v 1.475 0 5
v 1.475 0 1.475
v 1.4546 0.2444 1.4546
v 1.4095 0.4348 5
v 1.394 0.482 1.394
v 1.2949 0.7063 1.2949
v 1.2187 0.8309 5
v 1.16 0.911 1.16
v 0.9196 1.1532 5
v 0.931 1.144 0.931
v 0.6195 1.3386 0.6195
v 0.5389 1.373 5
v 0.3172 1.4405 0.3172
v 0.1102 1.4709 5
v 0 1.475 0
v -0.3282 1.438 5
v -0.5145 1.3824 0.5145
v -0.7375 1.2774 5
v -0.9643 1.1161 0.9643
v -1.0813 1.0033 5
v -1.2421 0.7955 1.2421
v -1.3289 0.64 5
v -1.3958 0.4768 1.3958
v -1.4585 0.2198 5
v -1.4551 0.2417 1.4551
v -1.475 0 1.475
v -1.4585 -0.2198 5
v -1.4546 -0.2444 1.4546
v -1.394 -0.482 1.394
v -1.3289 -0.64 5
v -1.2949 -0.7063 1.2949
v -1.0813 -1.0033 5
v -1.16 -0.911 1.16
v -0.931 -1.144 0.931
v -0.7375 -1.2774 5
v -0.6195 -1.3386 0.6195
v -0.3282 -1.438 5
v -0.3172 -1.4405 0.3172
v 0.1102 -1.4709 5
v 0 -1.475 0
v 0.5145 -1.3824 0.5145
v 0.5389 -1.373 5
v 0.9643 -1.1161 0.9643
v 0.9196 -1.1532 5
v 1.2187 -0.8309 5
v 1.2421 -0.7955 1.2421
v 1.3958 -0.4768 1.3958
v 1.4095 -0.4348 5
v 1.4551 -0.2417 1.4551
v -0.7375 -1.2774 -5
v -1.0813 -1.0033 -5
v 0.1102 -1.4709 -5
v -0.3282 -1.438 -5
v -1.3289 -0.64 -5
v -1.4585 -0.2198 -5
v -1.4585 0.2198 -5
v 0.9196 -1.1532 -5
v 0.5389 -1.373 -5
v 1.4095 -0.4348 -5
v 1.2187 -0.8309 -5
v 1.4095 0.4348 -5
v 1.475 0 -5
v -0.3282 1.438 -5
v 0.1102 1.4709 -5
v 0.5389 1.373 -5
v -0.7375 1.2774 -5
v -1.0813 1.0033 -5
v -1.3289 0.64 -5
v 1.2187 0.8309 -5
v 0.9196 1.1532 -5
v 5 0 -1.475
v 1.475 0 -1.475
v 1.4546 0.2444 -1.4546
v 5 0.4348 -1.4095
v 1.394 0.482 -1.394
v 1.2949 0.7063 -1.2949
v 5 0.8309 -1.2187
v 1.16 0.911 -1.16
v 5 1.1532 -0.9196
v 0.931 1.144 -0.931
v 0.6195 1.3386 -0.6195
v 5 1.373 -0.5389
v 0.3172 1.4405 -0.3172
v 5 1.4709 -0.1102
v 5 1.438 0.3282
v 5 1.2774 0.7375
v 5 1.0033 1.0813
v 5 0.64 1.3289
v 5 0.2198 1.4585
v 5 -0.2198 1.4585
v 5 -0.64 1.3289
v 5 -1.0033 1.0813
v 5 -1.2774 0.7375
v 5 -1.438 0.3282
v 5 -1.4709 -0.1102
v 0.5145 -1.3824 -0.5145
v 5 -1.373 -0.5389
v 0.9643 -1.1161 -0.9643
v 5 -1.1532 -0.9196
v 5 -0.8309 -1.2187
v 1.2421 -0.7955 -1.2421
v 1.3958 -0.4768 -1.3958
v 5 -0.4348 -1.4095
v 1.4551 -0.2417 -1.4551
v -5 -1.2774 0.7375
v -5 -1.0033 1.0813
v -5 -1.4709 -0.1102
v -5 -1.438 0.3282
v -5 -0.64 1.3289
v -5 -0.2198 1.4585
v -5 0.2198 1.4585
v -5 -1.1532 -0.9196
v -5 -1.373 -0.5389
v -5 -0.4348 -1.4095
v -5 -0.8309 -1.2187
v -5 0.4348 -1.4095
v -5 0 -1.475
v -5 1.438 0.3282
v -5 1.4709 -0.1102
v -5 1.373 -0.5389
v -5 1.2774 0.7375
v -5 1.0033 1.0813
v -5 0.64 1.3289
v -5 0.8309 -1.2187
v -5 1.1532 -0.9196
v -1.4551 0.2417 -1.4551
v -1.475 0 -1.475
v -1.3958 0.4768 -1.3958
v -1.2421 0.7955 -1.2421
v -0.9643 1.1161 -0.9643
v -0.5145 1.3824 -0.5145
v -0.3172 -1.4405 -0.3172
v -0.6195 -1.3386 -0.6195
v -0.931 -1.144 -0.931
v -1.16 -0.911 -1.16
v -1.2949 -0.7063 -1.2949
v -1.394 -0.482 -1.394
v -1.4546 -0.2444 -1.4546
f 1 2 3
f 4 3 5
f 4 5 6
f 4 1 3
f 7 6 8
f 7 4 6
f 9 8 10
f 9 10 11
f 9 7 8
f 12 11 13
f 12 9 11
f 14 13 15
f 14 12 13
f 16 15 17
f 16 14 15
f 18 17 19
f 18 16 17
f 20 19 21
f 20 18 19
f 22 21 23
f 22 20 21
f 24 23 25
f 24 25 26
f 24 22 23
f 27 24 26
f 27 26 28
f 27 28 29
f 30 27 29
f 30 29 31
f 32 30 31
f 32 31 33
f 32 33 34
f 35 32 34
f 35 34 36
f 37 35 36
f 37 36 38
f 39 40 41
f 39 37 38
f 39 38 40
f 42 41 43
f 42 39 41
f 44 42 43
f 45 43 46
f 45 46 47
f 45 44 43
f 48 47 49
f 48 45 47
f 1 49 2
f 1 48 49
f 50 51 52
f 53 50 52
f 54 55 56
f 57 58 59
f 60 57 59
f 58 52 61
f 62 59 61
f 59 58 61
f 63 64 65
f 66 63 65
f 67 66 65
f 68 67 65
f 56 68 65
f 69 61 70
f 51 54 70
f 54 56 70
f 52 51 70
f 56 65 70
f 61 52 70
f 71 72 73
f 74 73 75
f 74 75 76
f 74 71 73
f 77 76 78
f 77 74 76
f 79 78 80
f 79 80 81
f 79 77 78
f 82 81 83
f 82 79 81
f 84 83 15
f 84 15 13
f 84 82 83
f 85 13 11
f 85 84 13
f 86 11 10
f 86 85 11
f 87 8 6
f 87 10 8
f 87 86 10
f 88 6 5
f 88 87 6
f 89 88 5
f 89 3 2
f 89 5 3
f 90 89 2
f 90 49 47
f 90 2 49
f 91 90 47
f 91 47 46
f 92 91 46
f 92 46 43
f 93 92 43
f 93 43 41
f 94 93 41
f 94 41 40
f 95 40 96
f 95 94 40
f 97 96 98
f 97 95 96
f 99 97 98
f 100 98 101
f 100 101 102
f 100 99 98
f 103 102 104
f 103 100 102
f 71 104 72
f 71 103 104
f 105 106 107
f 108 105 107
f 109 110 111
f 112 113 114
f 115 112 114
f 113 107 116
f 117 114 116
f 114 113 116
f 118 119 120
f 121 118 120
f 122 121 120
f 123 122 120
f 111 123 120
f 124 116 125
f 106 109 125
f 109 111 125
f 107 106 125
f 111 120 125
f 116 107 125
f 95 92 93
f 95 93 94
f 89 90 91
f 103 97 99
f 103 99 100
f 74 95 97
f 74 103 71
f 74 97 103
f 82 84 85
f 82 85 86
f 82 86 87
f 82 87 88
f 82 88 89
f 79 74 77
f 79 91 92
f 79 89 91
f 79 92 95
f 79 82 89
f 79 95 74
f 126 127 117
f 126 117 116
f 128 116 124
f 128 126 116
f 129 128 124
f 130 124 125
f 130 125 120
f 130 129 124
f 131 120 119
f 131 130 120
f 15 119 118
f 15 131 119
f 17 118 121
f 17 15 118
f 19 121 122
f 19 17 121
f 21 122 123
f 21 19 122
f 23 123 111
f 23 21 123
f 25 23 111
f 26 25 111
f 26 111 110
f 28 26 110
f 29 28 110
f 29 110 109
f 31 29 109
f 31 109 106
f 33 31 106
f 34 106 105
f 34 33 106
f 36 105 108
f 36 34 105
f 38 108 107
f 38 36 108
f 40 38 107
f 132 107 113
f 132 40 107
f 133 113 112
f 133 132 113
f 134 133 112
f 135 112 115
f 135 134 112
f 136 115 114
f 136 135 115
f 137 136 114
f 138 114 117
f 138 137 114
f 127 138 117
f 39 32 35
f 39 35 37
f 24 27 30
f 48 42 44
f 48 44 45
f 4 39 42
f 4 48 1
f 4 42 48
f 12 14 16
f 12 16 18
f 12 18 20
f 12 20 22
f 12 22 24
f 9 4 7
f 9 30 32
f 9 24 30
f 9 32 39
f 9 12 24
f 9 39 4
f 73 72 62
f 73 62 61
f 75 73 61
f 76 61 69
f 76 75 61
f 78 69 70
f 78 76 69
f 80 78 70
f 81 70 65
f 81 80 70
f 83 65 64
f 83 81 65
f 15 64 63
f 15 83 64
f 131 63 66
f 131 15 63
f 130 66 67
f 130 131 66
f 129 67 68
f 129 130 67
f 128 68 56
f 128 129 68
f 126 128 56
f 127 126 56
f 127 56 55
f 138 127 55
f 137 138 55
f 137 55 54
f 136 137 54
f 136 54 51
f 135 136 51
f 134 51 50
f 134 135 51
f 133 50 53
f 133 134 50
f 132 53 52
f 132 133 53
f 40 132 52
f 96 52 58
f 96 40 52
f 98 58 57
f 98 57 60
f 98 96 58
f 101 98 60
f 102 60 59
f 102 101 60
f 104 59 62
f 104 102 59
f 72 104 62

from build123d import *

# Parameters (mm, degrees)
SKETCH1_R           = 1.475
BOSS_EXTRUDE1_DEPTH = 5
SKETCH2_R           = 1.475
BOSS_EXTRUDE2_DEPTH = 5


with BuildPart() as part:
    # Sketch1 → Boss-Extrude1 (new body, symmetric)
    with BuildSketch(Plane.XY):
        Circle(SKETCH1_R)
    extrude(amount=BOSS_EXTRUDE1_DEPTH, both=True)

    # Sketch2 → Boss-Extrude2 (add, symmetric)
    with BuildSketch(Plane(origin=(0, 0, 0), x_dir=(0, 0, -1), z_dir=(1, 0, 0))):
        Circle(SKETCH2_R)
    extrude(amount=BOSS_EXTRUDE2_DEPTH, both=True)


solid = part.part
